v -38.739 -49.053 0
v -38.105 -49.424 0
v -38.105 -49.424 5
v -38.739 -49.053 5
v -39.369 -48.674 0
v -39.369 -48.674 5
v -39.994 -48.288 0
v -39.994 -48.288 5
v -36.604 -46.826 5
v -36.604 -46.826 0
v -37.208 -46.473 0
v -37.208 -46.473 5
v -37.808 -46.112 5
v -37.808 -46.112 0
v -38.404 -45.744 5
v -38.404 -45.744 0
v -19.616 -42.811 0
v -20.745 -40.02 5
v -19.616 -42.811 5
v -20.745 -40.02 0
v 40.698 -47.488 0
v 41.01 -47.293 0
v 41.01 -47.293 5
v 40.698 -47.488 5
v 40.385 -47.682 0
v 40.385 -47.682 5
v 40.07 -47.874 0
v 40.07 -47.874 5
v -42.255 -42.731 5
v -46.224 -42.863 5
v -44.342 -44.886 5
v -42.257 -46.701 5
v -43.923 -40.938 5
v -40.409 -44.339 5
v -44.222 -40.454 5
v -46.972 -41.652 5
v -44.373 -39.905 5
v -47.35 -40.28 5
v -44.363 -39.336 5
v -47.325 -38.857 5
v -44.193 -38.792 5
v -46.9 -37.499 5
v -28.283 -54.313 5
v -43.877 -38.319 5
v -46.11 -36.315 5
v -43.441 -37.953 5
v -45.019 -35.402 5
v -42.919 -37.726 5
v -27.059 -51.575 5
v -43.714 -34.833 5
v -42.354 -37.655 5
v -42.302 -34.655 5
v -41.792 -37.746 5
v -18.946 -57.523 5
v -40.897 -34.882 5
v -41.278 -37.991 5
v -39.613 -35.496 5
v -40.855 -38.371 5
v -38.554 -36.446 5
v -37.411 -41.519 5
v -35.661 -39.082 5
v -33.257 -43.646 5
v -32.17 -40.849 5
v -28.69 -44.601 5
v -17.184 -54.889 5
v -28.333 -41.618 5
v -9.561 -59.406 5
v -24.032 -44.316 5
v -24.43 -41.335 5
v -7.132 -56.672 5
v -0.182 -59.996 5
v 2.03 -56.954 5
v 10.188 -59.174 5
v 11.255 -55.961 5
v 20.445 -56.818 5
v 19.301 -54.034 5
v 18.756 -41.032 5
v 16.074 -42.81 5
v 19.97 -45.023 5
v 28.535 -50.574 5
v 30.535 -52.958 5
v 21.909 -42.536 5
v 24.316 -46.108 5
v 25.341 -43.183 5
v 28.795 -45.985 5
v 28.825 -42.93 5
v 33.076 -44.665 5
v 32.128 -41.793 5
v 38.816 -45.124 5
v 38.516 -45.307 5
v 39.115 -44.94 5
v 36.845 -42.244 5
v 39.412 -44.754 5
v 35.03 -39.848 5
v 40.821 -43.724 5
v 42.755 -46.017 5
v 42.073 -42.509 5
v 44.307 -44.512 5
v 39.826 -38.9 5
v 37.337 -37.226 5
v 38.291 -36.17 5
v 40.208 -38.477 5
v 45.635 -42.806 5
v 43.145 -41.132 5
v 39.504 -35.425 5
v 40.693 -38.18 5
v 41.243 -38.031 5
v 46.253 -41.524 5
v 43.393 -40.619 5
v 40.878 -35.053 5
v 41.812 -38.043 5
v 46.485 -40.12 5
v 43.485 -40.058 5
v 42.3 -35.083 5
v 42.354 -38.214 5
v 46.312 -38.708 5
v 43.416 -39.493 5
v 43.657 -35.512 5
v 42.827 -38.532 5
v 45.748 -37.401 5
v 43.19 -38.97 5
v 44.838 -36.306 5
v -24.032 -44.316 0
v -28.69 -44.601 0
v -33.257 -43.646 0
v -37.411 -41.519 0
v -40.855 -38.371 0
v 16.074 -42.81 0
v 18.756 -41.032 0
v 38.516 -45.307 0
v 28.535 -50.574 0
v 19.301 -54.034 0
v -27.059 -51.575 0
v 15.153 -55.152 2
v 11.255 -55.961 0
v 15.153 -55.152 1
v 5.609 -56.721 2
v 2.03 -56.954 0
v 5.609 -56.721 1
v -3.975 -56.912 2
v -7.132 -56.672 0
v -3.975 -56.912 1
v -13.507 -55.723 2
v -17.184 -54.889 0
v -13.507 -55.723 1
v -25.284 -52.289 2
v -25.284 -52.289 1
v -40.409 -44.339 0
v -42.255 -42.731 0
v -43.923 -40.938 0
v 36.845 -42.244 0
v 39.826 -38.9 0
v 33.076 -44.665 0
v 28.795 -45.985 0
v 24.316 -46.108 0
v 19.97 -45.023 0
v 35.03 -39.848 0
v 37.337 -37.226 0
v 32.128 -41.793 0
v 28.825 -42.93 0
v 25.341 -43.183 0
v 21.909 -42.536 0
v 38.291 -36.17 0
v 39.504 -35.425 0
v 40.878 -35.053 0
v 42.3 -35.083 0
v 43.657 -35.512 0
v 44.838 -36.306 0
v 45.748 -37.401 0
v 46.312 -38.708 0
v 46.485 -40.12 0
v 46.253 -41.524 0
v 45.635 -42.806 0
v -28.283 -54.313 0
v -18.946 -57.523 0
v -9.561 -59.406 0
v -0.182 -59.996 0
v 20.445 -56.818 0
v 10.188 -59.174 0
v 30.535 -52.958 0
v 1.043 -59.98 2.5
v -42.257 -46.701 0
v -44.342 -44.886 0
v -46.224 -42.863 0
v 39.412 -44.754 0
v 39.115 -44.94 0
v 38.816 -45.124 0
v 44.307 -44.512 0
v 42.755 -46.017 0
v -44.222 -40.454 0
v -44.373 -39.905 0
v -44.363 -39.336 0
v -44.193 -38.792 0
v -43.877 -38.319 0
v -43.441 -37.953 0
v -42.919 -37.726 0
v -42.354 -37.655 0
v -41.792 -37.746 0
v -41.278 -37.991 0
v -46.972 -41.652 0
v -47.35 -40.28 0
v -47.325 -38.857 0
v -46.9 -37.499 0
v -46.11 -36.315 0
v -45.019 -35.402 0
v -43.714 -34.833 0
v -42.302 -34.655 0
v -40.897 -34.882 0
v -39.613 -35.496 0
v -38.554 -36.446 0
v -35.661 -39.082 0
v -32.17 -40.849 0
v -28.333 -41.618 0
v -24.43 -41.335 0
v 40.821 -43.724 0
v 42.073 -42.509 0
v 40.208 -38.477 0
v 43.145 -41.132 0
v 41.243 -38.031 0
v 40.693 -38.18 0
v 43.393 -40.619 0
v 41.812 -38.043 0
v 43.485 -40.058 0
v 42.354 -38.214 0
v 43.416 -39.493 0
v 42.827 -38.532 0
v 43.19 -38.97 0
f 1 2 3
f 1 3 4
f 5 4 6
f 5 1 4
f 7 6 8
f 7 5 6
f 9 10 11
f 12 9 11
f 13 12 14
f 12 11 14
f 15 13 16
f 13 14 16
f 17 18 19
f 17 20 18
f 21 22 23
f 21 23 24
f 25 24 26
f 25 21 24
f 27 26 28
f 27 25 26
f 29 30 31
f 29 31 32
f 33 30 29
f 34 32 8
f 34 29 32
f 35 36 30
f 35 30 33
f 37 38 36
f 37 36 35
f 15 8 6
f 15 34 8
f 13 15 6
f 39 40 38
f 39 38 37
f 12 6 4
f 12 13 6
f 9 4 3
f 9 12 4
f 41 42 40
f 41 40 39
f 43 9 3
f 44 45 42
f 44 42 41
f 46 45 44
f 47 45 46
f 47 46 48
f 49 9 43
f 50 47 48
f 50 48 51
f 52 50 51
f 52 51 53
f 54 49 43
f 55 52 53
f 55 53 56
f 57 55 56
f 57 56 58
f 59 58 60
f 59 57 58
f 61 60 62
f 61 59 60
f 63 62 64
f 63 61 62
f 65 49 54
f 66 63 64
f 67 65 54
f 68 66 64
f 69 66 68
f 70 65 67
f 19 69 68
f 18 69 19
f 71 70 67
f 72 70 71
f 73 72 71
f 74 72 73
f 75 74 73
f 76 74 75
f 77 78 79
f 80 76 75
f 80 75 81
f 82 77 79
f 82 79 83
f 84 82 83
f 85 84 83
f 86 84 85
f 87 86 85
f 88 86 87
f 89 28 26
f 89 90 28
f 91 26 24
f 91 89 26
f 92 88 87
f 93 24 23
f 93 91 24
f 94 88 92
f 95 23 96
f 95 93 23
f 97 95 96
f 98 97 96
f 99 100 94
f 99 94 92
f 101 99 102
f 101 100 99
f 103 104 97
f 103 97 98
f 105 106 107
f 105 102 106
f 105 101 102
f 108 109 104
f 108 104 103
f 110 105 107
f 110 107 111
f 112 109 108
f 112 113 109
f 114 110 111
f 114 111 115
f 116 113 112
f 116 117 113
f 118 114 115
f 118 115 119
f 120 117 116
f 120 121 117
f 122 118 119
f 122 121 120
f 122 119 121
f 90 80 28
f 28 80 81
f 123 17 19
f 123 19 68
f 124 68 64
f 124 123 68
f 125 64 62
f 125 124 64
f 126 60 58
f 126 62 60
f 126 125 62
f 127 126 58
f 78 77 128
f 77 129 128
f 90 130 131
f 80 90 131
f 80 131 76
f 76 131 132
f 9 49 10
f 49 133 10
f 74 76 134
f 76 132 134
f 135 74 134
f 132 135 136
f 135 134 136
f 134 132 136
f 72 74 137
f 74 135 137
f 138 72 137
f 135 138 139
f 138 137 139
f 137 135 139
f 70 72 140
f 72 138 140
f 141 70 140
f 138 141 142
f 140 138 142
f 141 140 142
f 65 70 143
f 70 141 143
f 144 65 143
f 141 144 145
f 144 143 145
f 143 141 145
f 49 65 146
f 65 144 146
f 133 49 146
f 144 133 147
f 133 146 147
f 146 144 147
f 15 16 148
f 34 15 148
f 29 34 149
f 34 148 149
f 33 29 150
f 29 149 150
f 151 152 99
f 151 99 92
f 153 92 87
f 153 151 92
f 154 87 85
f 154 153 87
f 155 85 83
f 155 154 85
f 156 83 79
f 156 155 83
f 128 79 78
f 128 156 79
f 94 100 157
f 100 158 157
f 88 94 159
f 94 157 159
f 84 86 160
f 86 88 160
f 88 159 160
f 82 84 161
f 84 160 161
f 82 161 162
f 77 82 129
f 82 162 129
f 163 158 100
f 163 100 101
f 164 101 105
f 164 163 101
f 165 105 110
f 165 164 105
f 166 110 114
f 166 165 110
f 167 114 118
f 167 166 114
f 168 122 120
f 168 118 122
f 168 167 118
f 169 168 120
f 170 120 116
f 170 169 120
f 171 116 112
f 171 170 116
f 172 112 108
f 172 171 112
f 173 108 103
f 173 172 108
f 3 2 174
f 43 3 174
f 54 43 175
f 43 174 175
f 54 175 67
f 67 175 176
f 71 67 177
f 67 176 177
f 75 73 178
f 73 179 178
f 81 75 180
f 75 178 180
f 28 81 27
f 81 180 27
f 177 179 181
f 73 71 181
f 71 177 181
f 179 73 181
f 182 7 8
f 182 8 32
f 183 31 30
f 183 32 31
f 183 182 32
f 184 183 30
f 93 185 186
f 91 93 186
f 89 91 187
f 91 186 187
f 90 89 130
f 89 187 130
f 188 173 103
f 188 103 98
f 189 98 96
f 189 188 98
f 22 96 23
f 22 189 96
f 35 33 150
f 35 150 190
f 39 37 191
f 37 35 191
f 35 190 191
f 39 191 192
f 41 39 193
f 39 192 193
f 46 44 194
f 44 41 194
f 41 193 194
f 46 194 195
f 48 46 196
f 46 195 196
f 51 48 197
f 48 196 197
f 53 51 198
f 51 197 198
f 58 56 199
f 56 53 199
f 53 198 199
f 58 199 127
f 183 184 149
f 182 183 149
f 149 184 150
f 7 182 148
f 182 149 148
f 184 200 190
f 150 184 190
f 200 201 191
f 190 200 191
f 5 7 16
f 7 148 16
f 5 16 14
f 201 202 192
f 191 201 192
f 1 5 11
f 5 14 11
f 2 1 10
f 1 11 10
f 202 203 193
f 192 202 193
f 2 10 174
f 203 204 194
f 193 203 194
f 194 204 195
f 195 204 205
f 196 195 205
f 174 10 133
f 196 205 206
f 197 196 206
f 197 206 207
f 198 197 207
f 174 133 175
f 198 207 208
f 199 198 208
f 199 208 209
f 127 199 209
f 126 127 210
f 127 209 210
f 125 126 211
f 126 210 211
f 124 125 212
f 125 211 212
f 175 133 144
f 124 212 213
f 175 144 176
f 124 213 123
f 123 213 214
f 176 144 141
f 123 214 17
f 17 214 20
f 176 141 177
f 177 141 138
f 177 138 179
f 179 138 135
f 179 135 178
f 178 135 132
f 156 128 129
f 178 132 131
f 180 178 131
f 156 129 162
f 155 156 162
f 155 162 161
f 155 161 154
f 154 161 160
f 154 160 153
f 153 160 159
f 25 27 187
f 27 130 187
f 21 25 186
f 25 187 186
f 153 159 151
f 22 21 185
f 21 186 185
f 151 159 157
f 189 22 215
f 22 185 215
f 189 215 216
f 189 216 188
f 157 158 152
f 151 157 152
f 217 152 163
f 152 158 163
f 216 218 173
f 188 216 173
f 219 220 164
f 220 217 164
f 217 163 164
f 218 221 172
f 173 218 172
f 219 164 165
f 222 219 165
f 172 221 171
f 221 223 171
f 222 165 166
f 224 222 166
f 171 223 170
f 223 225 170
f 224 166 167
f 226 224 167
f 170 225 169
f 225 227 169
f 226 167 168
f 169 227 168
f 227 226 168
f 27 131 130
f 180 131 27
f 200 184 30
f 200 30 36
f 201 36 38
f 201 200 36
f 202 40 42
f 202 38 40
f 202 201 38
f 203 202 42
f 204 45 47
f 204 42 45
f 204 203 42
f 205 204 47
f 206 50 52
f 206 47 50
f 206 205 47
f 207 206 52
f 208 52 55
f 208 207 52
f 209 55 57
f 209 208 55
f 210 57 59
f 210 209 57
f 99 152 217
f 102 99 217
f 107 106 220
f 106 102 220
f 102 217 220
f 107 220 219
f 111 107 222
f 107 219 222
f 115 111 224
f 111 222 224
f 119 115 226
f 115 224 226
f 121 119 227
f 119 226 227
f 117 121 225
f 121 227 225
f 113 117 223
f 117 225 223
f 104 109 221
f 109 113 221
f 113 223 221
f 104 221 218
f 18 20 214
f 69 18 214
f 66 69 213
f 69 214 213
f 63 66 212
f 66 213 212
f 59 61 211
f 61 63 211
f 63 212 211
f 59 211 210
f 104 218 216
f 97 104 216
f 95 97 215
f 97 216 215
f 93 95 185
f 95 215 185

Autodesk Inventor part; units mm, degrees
ref_plane "YZ Plane" through (0, 0, 0) normal (1, 0, 0) x (0, 1, 0)
ref_plane "XZ Plane" through (0, 0, 0) normal (0, 1, 0) x (-1, 0, 0)
ref_plane "XY Plane" through (0, 0, 0) normal (0, 0, 1) x (1, 0, 0)
sketch "スケッチ1" plane through (0, 0, 0) normal (0, 0, 1) x (1, 0, 0)
  spline S0 degree 4 poles (38.5164, -45.3071) (32.8487, -48.7376) (24.871, -52.6644) (14.1977, -56.036) (0.8351, -57.2731) (-12.4819, -56.5781) (-23.1394, -53.6461) (-31.0456, -50.0372) (-36.604, -46.8264) knots 0 0 0 0 0 0.316482 0.440352 0.563601 0.687002 1 1 1 1 1
  circle A0 centre (0, 0) radius 1.3
  circle A1 centre (0, 0) radius 2.5
  circle A2 centre (0, 0) radius 5
  line L0 (4.899, 1) -> (9.798, -23)
  line L1 (-4.899, 1) -> (-9.798, -23)
  line L2 (-3.817, -10.1196) -> (-8.9705, -20.5808)
  circle A3 centre (0, -12) radius 4.255
  line L3 (3.817, -10.1196) -> (8.9705, -20.5808)
  circle A4 centre (0.0033, -24.9496) radius 10
  circle A5 centre (0, -25) radius 7.025
  spline S1 degree 4 poles (51.4895, -34.9586) (51.1529, -35.2256) (50.6846, -35.5944) (50.0873, -36.0604) (49.3638, -36.6179) (48.8453, -37.0139) (48.332, -37.4027) (47.8236, -37.7843) (47.3201, -38.159) (46.8211, -38.527) (46.3265, -38.8884) (45.8362, -39.2435) (45.3499, -39.5924) (44.8675, -39.9354) (44.3888, -40.2724) (43.9136, -40.6038) (43.4419, -40.9296) (42.9735, -41.25) (42.5081, -41.5651) (42.0458, -41.8751) (41.5864, -42.18) (41.1297, -42.48) (40.6756, -42.7752) (40.2241, -43.0657) (39.7749, -43.3517) (39.328, -43.6331) (38.8834, -43.9101) (38.4408, -44.1828) (38.0002, -44.4513) (37.5615, -44.7157) (37.1246, -44.9759) (36.6894, -45.2322) (36.2559, -45.4846) (35.8239, -45.7332) (35.3934, -45.9779) (34.9643, -46.2189) (34.5365, -46.4563) (34.1101, -46.6901) (33.6848, -46.9203) (33.2606, -47.1471) (32.8375, -47.3704) (32.4155, -47.5903) (31.9943, -47.8068) (31.5741, -48.0201) (31.1548, -48.23) (30.7362, -48.4368) (30.3184, -48.6403) (29.9013, -48.8407) (29.4848, -49.038) (29.069, -49.2322) (28.6537, -49.4233) (28.239, -49.6114) (27.8248, -49.7965) (27.411, -49.9786) (26.9977, -50.1578) (26.5847, -50.334) (26.1721, -50.5073) (25.7598, -50.6777) (25.3479, -50.8453) (24.9362, -51.01) (24.5247, -51.1719) (24.1135, -51.331) (23.7024, -51.4873) (23.2916, -51.6408) (22.8809, -51.7915) (22.4703, -51.9394) (22.0598, -52.0847) (21.6495, -52.2271) (21.2392, -52.3669) (20.829, -52.504) (20.4188, -52.6383) (20.0086, -52.77) (19.5985, -52.8989) (19.1884, -53.0252) (18.7783, -53.1489) (18.3681, -53.2698) (17.958, -53.3881) (17.5477, -53.5038) (17.1375, -53.6167) (16.7272, -53.7271) (16.3168, -53.8348) (15.9064, -53.9399) (15.4959, -54.0424) (15.0853, -54.1422) (14.6747, -54.2394) (14.2639, -54.334) (13.8531, -54.426) (13.4422, -54.5153) (13.0311, -54.6021) (12.62, -54.6862) (12.2088, -54.7677) (11.7975, -54.8466) (11.3861, -54.9229) (10.9746, -54.9966) (10.563, -55.0677) (10.1513, -55.1362) (9.7395, -55.2021) (9.3276, -55.2654) (8.9156, -55.3261) (8.5036, -55.3842) (8.0914, -55.4397) (7.6792, -55.4926) (7.2669, -55.5428) (6.8545, -55.5905) (6.4421, -55.6356) (6.0295, -55.6781) (5.617, -55.718) (5.2043, -55.7553) (4.7916, -55.79) (4.3789, -55.822) (3.9661, -55.8515) (3.5533, -55.8784) (3.1405, -55.9027) (2.7276, -55.9244) (2.3147, -55.9435) (1.9018, -55.96) (1.489, -55.9739) (1.0761, -55.9851) (0.6632, -55.9938) (0.2503, -55.9999) (-0.1625, -56.0034) (-0.5753, -56.0043) (-0.9881, -56.0026) (-1.4008, -55.9982) (-1.8134, -55.9913) (-2.2261, -55.9818) (-2.6386, -55.9697) (-3.0511, -55.955) (-3.4634, -55.9376) (-3.8757, -55.9177) (-4.2879, -55.8952) (-4.7, -55.8701) (-5.112, -55.8424) (-5.5239, -55.8121) (-5.9357, -55.7791) (-6.3473, -55.7436) (-6.7588, -55.7055) (-7.1701, -55.6648) (-7.5813, -55.6215) (-7.9923, -55.5756) (-8.4032, -55.5271) (-8.8139, -55.4761) (-9.2244, -55.4224) (-9.6348, -55.3661) (-10.0449, -55.3072) (-10.4549, -55.2458) (-10.8647, -55.1817) (-11.2743, -55.1151) (-11.6837, -55.0458) (-12.0928, -54.974) (-12.5018, -54.8995) (-12.9105, -54.8225) (-13.3191, -54.7429) (-13.7274, -54.6607) (-14.1355, -54.5759) (-14.5434, -54.4884) (-14.951, -54.3984) (-15.3585, -54.3058) (-15.7657, -54.2106) (-16.1727, -54.1128) (-16.5794, -54.0124) (-16.986, -53.9094) (-17.3923, -53.8038) (-17.7984, -53.6956) (-18.2043, -53.5848) (-18.61, -53.4713) (-19.0155, -53.3553) (-19.4208, -53.2366) (-19.8259, -53.1153) (-20.2308, -52.9913) (-20.6356, -52.8648) (-21.0401, -52.7355) (-21.4446, -52.6037) (-21.8489, -52.4692) (-22.253, -52.332) (-22.657, -52.1921) (-23.0609, -52.0496) (-23.4648, -51.9044) (-23.8685, -51.7565) (-24.2722, -51.6059) (-24.6759, -51.4526) (-25.0796, -51.2965) (-25.4832, -51.1377) (-25.8869, -50.9761) (-26.2907, -50.8117) (-26.6945, -50.6446) (-27.0985, -50.4746) (-27.5026, -50.3018) (-27.9068, -50.1261) (-28.3113, -49.9476) (-28.7161, -49.7661) (-29.1211, -49.5817) (-29.5265, -49.3944) (-29.9322, -49.204) (-30.3384, -49.0107) (-30.7451, -48.8142) (-31.1523, -48.6147) (-31.5601, -48.412) (-31.9685, -48.2062) (-32.3777, -47.9971) (-32.7876, -47.7847) (-33.1984, -47.569) (-33.6102, -47.3499) (-34.023, -47.1273) (-34.4368, -46.9012) (-34.8519, -46.6716) (-35.2682, -46.4382) (-35.686, -46.2011) (-36.1052, -45.9602) (-36.5261, -45.7154) (-36.9487, -45.4665) (-37.3732, -45.2135) (-37.7997, -44.9563) (-38.2284, -44.6947) (-38.6594, -44.4287) (-39.0929, -44.158) (-39.5291, -43.8825) (-39.9681, -43.6021) (-40.4101, -43.3165) (-40.8555, -43.0257) (-41.3043, -42.7295) (-41.7569, -42.4275) (-42.2135, -42.1196) (-42.6743, -41.8055) (-43.1398, -41.485) (-43.6102, -41.1578) (-44.0858, -40.8236) (-44.567, -40.482) (-45.0542, -40.1327) (-45.5479, -39.7753) (-46.0484, -39.4095) (-46.5564, -39.0347) (-47.0722, -38.6504) (-47.5966, -38.2562) (-48.13, -37.8515) (-48.6732, -37.4356) (-49.2269, -37.0078) (-50.01, -36.3976) (-50.6631, -35.8819) (-51.1798, -35.4699) (-51.5542, -35.1694) knots 0 0 0 0 0 0.01253 0.017489 0.022414 0.027307 0.032168 0.036998 0.041798 0.046569 0.051311 0.056026 0.060715 0.065378 0.070016 0.074629 0.079219 0.083786 0.088331 0.092854 0.097357 0.101839 0.106302 0.110746 0.115172 0.119579 0.12397 0.128343 0.132701 0.137042 0.141369 0.14568 0.149978 0.154261 0.158531 0.162788 0.167033 0.171265 0.175486 0.179695 0.183893 0.18808 0.192257 0.196424 0.200581 0.204729 0.208867 0.212997 0.217119 0.221232 0.225337 0.229434 0.233524 0.237607 0.241682 0.245751 0.249814 0.25387 0.25792 0.261964 0.266002 0.270035 0.274062 0.278085 0.282102 0.286114 0.290122 0.294125 0.298124 0.302119 0.30611 0.310097 0.31408 0.318059 0.322035 0.326007 0.329976 0.333942 0.337905 0.341865 0.345823 0.349777 0.353729 0.357678 0.361625 0.365569 0.369511 0.373451 0.377389 0.381325 0.385259 0.389191 0.393122 0.39705 0.400977 0.404903 0.408826 0.412749 0.41667 0.42059 0.424508 0.428426 0.432342 0.436257 0.440171 0.444085 0.447997 0.451908 0.455819 0.459729 0.463638 0.467547 0.471454 0.475362 0.479269 0.483175 0.487081 0.490987 0.494892 0.498797 0.502702 0.506607 0.510511 0.514415 0.51832 0.522224 0.526128 0.530033 0.533937 0.537842 0.541747 0.545652 0.549557 0.553463 0.557369 0.561276 0.565183 0.56909 0.572998 0.576907 0.580817 0.584727 0.588638 0.592549 0.596462 0.600375 0.60429 0.608205 0.612122 0.616039 0.619958 0.623879 0.6278 0.631723 0.635647 0.639573 0.643501 0.64743 0.651361 0.655294 0.659229 0.663165 0.667104 0.671045 0.674989 0.678934 0.682883 0.686833 0.690787 0.694743 0.698702 0.702664 0.70663 0.710598 0.71457 0.718546 0.722525 0.726508 0.730496 0.734487 0.738483 0.742483 0.746488 0.750498 0.754514 0.758534 0.76256 0.766592 0.77063 0.774674 0.778725 0.782783 0.786848 0.79092 0.795001 0.799089 0.803186 0.807291 0.811406 0.815531 0.819665 0.82381 0.827967 0.832134 0.836314 0.840506 0.844711 0.84893 0.853163 0.857412 0.861676 0.865957 0.870254 0.87457 0.878905 0.88326 0.887636 0.892033 0.896453 0.900898 0.905368 0.909864 0.914388 0.918942 0.923526 0.928143 0.932794 0.937481 0.942205 0.94697 0.951777 0.956628 0.961526 0.966473 0.971473 0.976527 0.981641 0.986815 1 1 1 1 1 construction
  line L4 (-36.604, -46.8264) -> (0, 0) construction
  line L5 (0, 0) -> (38.5164, -45.3071) construction
  line L6 (-38.4038, -45.7442) -> (0, 0) construction
  line L7 (39.4123, -44.7541) -> (0, 0) construction
  line L8 (0, 0) -> (-43.9228, -40.9378) construction
  line L9 (43.1454, -41.1321) -> (0, 0) construction
  arc A6 (-38.4038, -45.7442) -> (-36.604, -46.8264) centre (-6.5918, 5.1281) ccw
  arc A7 (38.5164, -45.3071) -> (39.4123, -44.7541) centre (7.4479, 6.0227) ccw
  arc A8 (-43.9228, -40.9378) -> (-38.4038, -45.7442) centre (-26.0471, -25.9839) ccw
  arc A9 (39.4123, -44.7541) -> (43.1454, -41.1321) centre (32.7173, -34.1188) ccw
  line L10 (36.2541, -30.9682) -> (42.4664, -35.652)
  line L11 (-31.1512, -26.4822) -> (-36.604, -31.0671)
  line L12 (-36.604, -96) -> (31.1535, -96) construction
  line L13 (-33.8776, -60) -> (44.0237, -60) construction
  line L14 (59.4013, -96) -> (59.4013, -81)
  line L15 (59.4013, -81) -> (-53.0814, -81) construction
  arc A10 (36.2232, -74.5536) -> (59.4013, -81) centre (70, 2) ccw construction
  line L16 (70, 2) -> (36.2232, -74.5536) construction
  line L17 (70, 2) -> (59.4013, -81) construction
  arc A11 (-71.6102, -42.5485) -> (-53.0814, -81) centre (70, 2) ccw construction
  line L18 (70, 2) -> (-71.6102, -42.5485) construction
  line L19 (70, 2) -> (-53.0814, -81) construction
  line L20 (-71.6102, -42.5485) -> (36.2232, -74.5536) construction
  arc A12 (-53.0814, -81) -> (-15.0732, -119.6576) centre (70, 2) ccw construction
  line L21 (70, 2) -> (-15.0732, -119.6576) construction
  line L22 (70, 2) -> (-53.0814, -81) construction
  arc A13 (59.4013, -81) -> (89.9091, -79.2709) centre (70, 2) ccw construction
  line L23 (70, 2) -> (89.9091, -79.2709) construction
  line L24 (70, 2) -> (59.4013, -81) construction
  line L25 (-15.0732, -119.6576) -> (89.9091, -79.2709) construction
  arc A14 (-40.8548, -38.3712) -> (-43.9228, -40.9378) centre (-42.3888, -39.6545) ccw
  line L26 (-43.9228, -40.9378) -> (-42.3888, -39.6545) construction
  line L27 (-40.8548, -38.3712) -> (-42.3888, -39.6545) construction
  arc A15 (43.1454, -41.1321) -> (39.8262, -38.8998) centre (41.4858, -40.016) ccw
  line L28 (43.1454, -41.1321) -> (41.4858, -40.016) construction
  line L29 (39.8262, -38.8998) -> (41.4858, -40.016) construction
  arc A16 (9.8434, -26.7306) -> (39.8262, -38.8998) centre (26.1095, -29.6747) ccw
  arc A17 (-40.8548, -38.3712) -> (-9.9651, -25.7437) centre (-27.4224, -27.1344) ccw
  arc A18 (-38.5537, -36.4463) -> (-12.9543, -25.9986) centre (-27.4224, -27.1344) ccw
  arc A19 (-38.5537, -36.4463) -> (-46.2238, -42.8627) centre (-42.3888, -39.6545) ccw
  arc A20 (-46.2238, -42.8627) -> (-39.9944, -48.2878) centre (-26.0471, -25.9839) ccw
  arc A21 (-39.9944, -48.2878) -> (-38.1046, -49.4241) centre (-6.5918, 5.1281) ccw
  arc A22 (40.0699, -47.8736) -> (41.0105, -47.2929) centre (7.4479, 6.0227) ccw
  arc A23 (41.0105, -47.2929) -> (45.6348, -42.8063) centre (32.7173, -34.1188) ccw
  arc A24 (45.6348, -42.8063) -> (37.3369, -37.2256) centre (41.4858, -40.016) ccw
  arc A25 (12.7927, -27.28) -> (37.3369, -37.2256) centre (26.1095, -29.6747) ccw
  line L30 (-20.7448, -40.0195) -> (-19.6157, -42.8107)
  line L31 (18.7559, -41.0323) -> (16.0741, -42.8103)
  spline S2 degree 4 poles (38.5164, -45.3071) (32.8478, -48.7393) (24.8691, -52.6682) (14.1948, -56.0416) (0.8318, -57.2787) (-12.4847, -56.5826) (-23.1412, -53.6487) (-31.0464, -50.0382) (-36.604, -46.8264) knots 0 0 0 0 0 0.316504 0.440374 0.56362 0.687015 1 1 1 1 1
  circle A26 centre (0, 0) radius 1.3
  circle A27 centre (0, 0) radius 2.5
  circle A28 centre (0, 0) radius 5
  line L32 (4.899, 1) -> (9.798, -23)
  line L33 (-4.899, 1) -> (-9.798, -23)
  line L34 (-3.817, -10.1196) -> (-8.9705, -20.5808)
  circle A29 centre (0, -12) radius 4.255
  line L35 (3.817, -10.1196) -> (8.9705, -20.5808)
  circle A30 centre (0.0012, -24.9711) radius 10
  circle A31 centre (0, -25) radius 7.025
  spline S3 degree 4 poles (51.4895, -34.9586) (51.1529, -35.2256) (50.6846, -35.5944) (50.0873, -36.0604) (49.3638, -36.6179) (48.8453, -37.0139) (48.332, -37.4027) (47.8236, -37.7843) (47.3201, -38.159) (46.8211, -38.527) (46.3265, -38.8884) (45.8362, -39.2435) (45.3499, -39.5924) (44.8675, -39.9354) (44.3888, -40.2724) (43.9136, -40.6038) (43.4419, -40.9296) (42.9735, -41.25) (42.5081, -41.5651) (42.0458, -41.8751) (41.5864, -42.18) (41.1297, -42.48) (40.6756, -42.7752) (40.2241, -43.0657) (39.7749, -43.3517) (39.328, -43.6331) (38.8834, -43.9101) (38.4408, -44.1828) (38.0002, -44.4513) (37.5615, -44.7157) (37.1246, -44.9759) (36.6894, -45.2322) (36.2559, -45.4846) (35.8239, -45.7332) (35.3934, -45.9779) (34.9643, -46.2189) (34.5365, -46.4563) (34.1101, -46.6901) (33.6848, -46.9203) (33.2606, -47.1471) (32.8375, -47.3704) (32.4155, -47.5903) (31.9943, -47.8068) (31.5741, -48.0201) (31.1548, -48.23) (30.7362, -48.4368) (30.3184, -48.6403) (29.9013, -48.8407) (29.4848, -49.038) (29.069, -49.2322) (28.6537, -49.4233) (28.239, -49.6114) (27.8248, -49.7965) (27.411, -49.9786) (26.9977, -50.1578) (26.5847, -50.334) (26.1721, -50.5073) (25.7598, -50.6777) (25.3479, -50.8453) (24.9362, -51.01) (24.5247, -51.1719) (24.1135, -51.331) (23.7024, -51.4873) (23.2916, -51.6408) (22.8809, -51.7915) (22.4703, -51.9394) (22.0598, -52.0847) (21.6495, -52.2271) (21.2392, -52.3669) (20.829, -52.504) (20.4188, -52.6383) (20.0086, -52.77) (19.5985, -52.8989) (19.1884, -53.0252) (18.7783, -53.1489) (18.3681, -53.2698) (17.958, -53.3881) (17.5477, -53.5038) (17.1375, -53.6167) (16.7272, -53.7271) (16.3168, -53.8348) (15.9064, -53.9399) (15.4959, -54.0424) (15.0853, -54.1422) (14.6747, -54.2394) (14.2639, -54.334) (13.8531, -54.426) (13.4422, -54.5153) (13.0311, -54.6021) (12.62, -54.6862) (12.2088, -54.7677) (11.7975, -54.8466) (11.3861, -54.9229) (10.9746, -54.9966) (10.563, -55.0677) (10.1513, -55.1362) (9.7395, -55.2021) (9.3276, -55.2654) (8.9156, -55.3261) (8.5036, -55.3842) (8.0914, -55.4397) (7.6792, -55.4926) (7.2669, -55.5428) (6.8545, -55.5905) (6.4421, -55.6356) (6.0295, -55.6781) (5.617, -55.718) (5.2043, -55.7553) (4.7916, -55.79) (4.3789, -55.822) (3.9661, -55.8515) (3.5533, -55.8784) (3.1405, -55.9027) (2.7276, -55.9244) (2.3147, -55.9435) (1.9018, -55.96) (1.489, -55.9739) (1.0761, -55.9851) (0.6632, -55.9938) (0.2503, -55.9999) (-0.1625, -56.0034) (-0.5753, -56.0043) (-0.9881, -56.0026) (-1.4008, -55.9982) (-1.8134, -55.9913) (-2.2261, -55.9818) (-2.6386, -55.9697) (-3.0511, -55.955) (-3.4634, -55.9376) (-3.8757, -55.9177) (-4.2879, -55.8952) (-4.7, -55.8701) (-5.112, -55.8424) (-5.5239, -55.8121) (-5.9357, -55.7791) (-6.3473, -55.7436) (-6.7588, -55.7055) (-7.1701, -55.6648) (-7.5813, -55.6215) (-7.9923, -55.5756) (-8.4032, -55.5271) (-8.8139, -55.4761) (-9.2244, -55.4224) (-9.6348, -55.3661) (-10.0449, -55.3072) (-10.4549, -55.2458) (-10.8647, -55.1817) (-11.2743, -55.1151) (-11.6837, -55.0458) (-12.0928, -54.974) (-12.5018, -54.8995) (-12.9105, -54.8225) (-13.3191, -54.7429) (-13.7274, -54.6607) (-14.1355, -54.5759) (-14.5434, -54.4884) (-14.951, -54.3984) (-15.3585, -54.3058) (-15.7657, -54.2106) (-16.1727, -54.1128) (-16.5794, -54.0124) (-16.986, -53.9094) (-17.3923, -53.8038) (-17.7984, -53.6956) (-18.2043, -53.5848) (-18.61, -53.4713) (-19.0155, -53.3553) (-19.4208, -53.2366) (-19.8259, -53.1153) (-20.2308, -52.9913) (-20.6356, -52.8648) (-21.0401, -52.7355) (-21.4446, -52.6037) (-21.8489, -52.4692) (-22.253, -52.332) (-22.657, -52.1921) (-23.0609, -52.0496) (-23.4648, -51.9044) (-23.8685, -51.7565) (-24.2722, -51.6059) (-24.6759, -51.4526) (-25.0796, -51.2965) (-25.4832, -51.1377) (-25.8869, -50.9761) (-26.2907, -50.8117) (-26.6945, -50.6446) (-27.0985, -50.4746) (-27.5026, -50.3018) (-27.9068, -50.1261) (-28.3113, -49.9476) (-28.7161, -49.7661) (-29.1211, -49.5817) (-29.5265, -49.3944) (-29.9322, -49.204) (-30.3384, -49.0107) (-30.7451, -48.8142) (-31.1523, -48.6147) (-31.5601, -48.412) (-31.9685, -48.2062) (-32.3777, -47.9971) (-32.7876, -47.7847) (-33.1984, -47.569) (-33.6102, -47.3499) (-34.023, -47.1273) (-34.4368, -46.9012) (-34.8519, -46.6716) (-35.2682, -46.4382) (-35.686, -46.2011) (-36.1052, -45.9602) (-36.5261, -45.7154) (-36.9487, -45.4665) (-37.3732, -45.2135) (-37.7997, -44.9563) (-38.2284, -44.6947) (-38.6594, -44.4287) (-39.0929, -44.158) (-39.5291, -43.8825) (-39.9681, -43.6021) (-40.4101, -43.3165) (-40.8555, -43.0257) (-41.3043, -42.7295) (-41.7569, -42.4275) (-42.2135, -42.1196) (-42.6743, -41.8055) (-43.1398, -41.485) (-43.6102, -41.1578) (-44.0858, -40.8236) (-44.567, -40.482) (-45.0542, -40.1327) (-45.5479, -39.7753) (-46.0484, -39.4095) (-46.5564, -39.0347) (-47.0722, -38.6504) (-47.5966, -38.2562) (-48.13, -37.8515) (-48.6732, -37.4356) (-49.2269, -37.0078) (-50.01, -36.3976) (-50.6631, -35.8819) (-51.1798, -35.4699) (-51.5542, -35.1694) knots 0 0 0 0 0 0.01253 0.017489 0.022414 0.027307 0.032168 0.036998 0.041798 0.046569 0.051311 0.056026 0.060715 0.065378 0.070016 0.074629 0.079219 0.083786 0.088331 0.092854 0.097357 0.101839 0.106302 0.110746 0.115172 0.119579 0.12397 0.128343 0.132701 0.137042 0.141369 0.14568 0.149978 0.154261 0.158531 0.162788 0.167033 0.171265 0.175486 0.179695 0.183893 0.18808 0.192257 0.196424 0.200581 0.204729 0.208867 0.212997 0.217119 0.221232 0.225337 0.229434 0.233524 0.237607 0.241682 0.245751 0.249814 0.25387 0.25792 0.261964 0.266002 0.270035 0.274062 0.278085 0.282102 0.286114 0.290122 0.294125 0.298124 0.302119 0.30611 0.310097 0.31408 0.318059 0.322035 0.326007 0.329976 0.333942 0.337905 0.341865 0.345823 0.349777 0.353729 0.357678 0.361625 0.365569 0.369511 0.373451 0.377389 0.381325 0.385259 0.389191 0.393122 0.39705 0.400977 0.404903 0.408826 0.412749 0.41667 0.42059 0.424508 0.428426 0.432342 0.436257 0.440171 0.444085 0.447997 0.451908 0.455819 0.459729 0.463638 0.467547 0.471454 0.475362 0.479269 0.483175 0.487081 0.490987 0.494892 0.498797 0.502702 0.506607 0.510511 0.514415 0.51832 0.522224 0.526128 0.530033 0.533937 0.537842 0.541747 0.545652 0.549557 0.553463 0.557369 0.561276 0.565183 0.56909 0.572998 0.576907 0.580817 0.584727 0.588638 0.592549 0.596462 0.600375 0.60429 0.608205 0.612122 0.616039 0.619958 0.623879 0.6278 0.631723 0.635647 0.639573 0.643501 0.64743 0.651361 0.655294 0.659229 0.663165 0.667104 0.671045 0.674989 0.678934 0.682883 0.686833 0.690787 0.694743 0.698702 0.702664 0.70663 0.710598 0.71457 0.718546 0.722525 0.726508 0.730496 0.734487 0.738483 0.742483 0.746488 0.750498 0.754514 0.758534 0.76256 0.766592 0.77063 0.774674 0.778725 0.782783 0.786848 0.79092 0.795001 0.799089 0.803186 0.807291 0.811406 0.815531 0.819665 0.82381 0.827967 0.832134 0.836314 0.840506 0.844711 0.84893 0.853163 0.857412 0.861676 0.865957 0.870254 0.87457 0.878905 0.88326 0.887636 0.892033 0.896453 0.900898 0.905368 0.909864 0.914388 0.918942 0.923526 0.928143 0.932794 0.937481 0.942205 0.94697 0.951777 0.956628 0.961526 0.966473 0.971473 0.976527 0.981641 0.986815 1 1 1 1 1 construction
  line L36 (-36.604, -46.8264) -> (0, 0) construction
  line L37 (0, 0) -> (38.5164, -45.3071) construction
  line L38 (-38.4035, -45.7439) -> (0, 0) construction
  line L39 (39.4122, -44.754) -> (0, 0) construction
  line L40 (0, 0) -> (-43.9228, -40.9378) construction
  line L41 (43.1454, -41.1321) -> (0, 0) construction
  arc A32 (-38.4035, -45.7439) -> (-36.604, -46.8264) centre (-6.5817, 5.1223) ccw
  arc A33 (38.5164, -45.3071) -> (39.4122, -44.754) centre (7.4403, 6.0181) ccw
  arc A34 (-43.9228, -40.9378) -> (-38.4035, -45.7439) centre (-26.0235, -25.9549) ccw
  arc A35 (39.4122, -44.754) -> (43.1454, -41.1321) centre (32.7099, -34.1106) ccw
  line L42 (36.2541, -30.9682) -> (42.4664, -35.652)
  line L43 (-31.1512, -26.4822) -> (-36.604, -31.0671)
  line L44 (-36.604, -96) -> (31.1535, -96) construction
  line L45 (-33.8776, -60) -> (44.0237, -60) construction
  line L46 (59.4013, -96) -> (59.4013, -81)
  line L47 (59.4013, -81) -> (-53.0814, -81) construction
  arc A36 (36.2232, -74.5536) -> (59.4013, -81) centre (70, 2) ccw construction
  line L48 (70, 2) -> (36.2232, -74.5536) construction
  line L49 (70, 2) -> (59.4013, -81) construction
  arc A37 (-71.6102, -42.5485) -> (-53.0814, -81) centre (70, 2) ccw construction
  line L50 (70, 2) -> (-71.6102, -42.5485) construction
  line L51 (70, 2) -> (-53.0814, -81) construction
  line L52 (-71.6102, -42.5485) -> (36.2232, -74.5536) construction
  arc A38 (-53.0814, -81) -> (-15.0732, -119.6576) centre (70, 2) ccw construction
  line L53 (70, 2) -> (-15.0732, -119.6576) construction
  line L54 (70, 2) -> (-53.0814, -81) construction
  arc A39 (59.4013, -81) -> (89.9091, -79.2709) centre (70, 2) ccw construction
  line L55 (70, 2) -> (89.9091, -79.2709) construction
  line L56 (70, 2) -> (59.4013, -81) construction
  line L57 (-15.0732, -119.6576) -> (89.9091, -79.2709) construction
  arc A40 (-40.8555, -38.3703) -> (-43.9228, -40.9378) centre (-42.3892, -39.654) ccw
  line L58 (-43.9228, -40.9378) -> (-42.3892, -39.654) construction
  line L59 (-40.8555, -38.3703) -> (-42.3892, -39.654) construction
  arc A41 (43.1454, -41.1321) -> (39.8267, -38.8991) centre (41.4861, -40.0156) ccw
  line L60 (43.1454, -41.1321) -> (41.4861, -40.0156) construction
  line L61 (39.8267, -38.8991) -> (41.4861, -40.0156) construction
  arc A42 (9.843, -26.7427) -> (39.8267, -38.8991) centre (26.1119, -29.6712) ccw
  arc A43 (-40.8555, -38.3703) -> (-9.968, -25.7556) centre (-27.4267, -27.1294) ccw
  spline S4 degree 5 poles (-38.1046, -49.4241) (-30.9925, -53.5325) (-23.4374, -56.8772) (-15.4062, -59.1353) (1.1247, -61.1969) (17.5495, -58.3842) (25.5171, -55.7659) (32.9958, -52.1545) (40.0699, -47.8736) knots 0 0 0 0 0 0 0.498337 0.498337 0.498337 1 1 1 1 1 1
  point P0 (50.9482, -35.3862)
  point P1 (50.4129, -35.8055)
  point P2 (49.8835, -36.2167)
  point P3 (49.3597, -36.6202)
  point P4 (48.8414, -37.0162)
  point P5 (48.3282, -37.4048)
  point P6 (47.82, -37.7863)
  point P7 (47.3165, -38.1609)
  point P8 (46.8177, -38.5288)
  point P9 (46.3232, -38.8901)
  point P10 (45.833, -39.2452)
  point P11 (45.3467, -39.594)
  point P12 (44.8644, -39.9368)
  point P13 (44.3858, -40.2738)
  point P14 (43.9108, -40.6051)
  point P15 (43.4391, -40.9309)
  point P16 (42.9708, -41.2512)
  point P17 (42.5055, -41.5662)
  point P18 (42.0433, -41.8761)
  point P19 (41.5839, -42.181)
  point P20 (41.1273, -42.4809)
  point P21 (40.6733, -42.7761)
  point P22 (40.2218, -43.0666)
  point P23 (39.7727, -43.3524)
  point P24 (39.3259, -43.6338)
  point P25 (38.8813, -43.9108)
  point P26 (38.4387, -44.1834)
  point P27 (37.9982, -44.4519)
  point P28 (37.5596, -44.7162)
  point P29 (37.1227, -44.9764)
  point P30 (36.6876, -45.2327)
  point P31 (36.2541, -45.485)
  point P32 (35.8222, -45.7335)
  point P33 (35.3917, -45.9782)
  point P34 (34.9627, -46.2192)
  point P35 (34.535, -46.4566)
  point P36 (34.1085, -46.6903)
  point P37 (33.6833, -46.9205)
  point P38 (33.2592, -47.1472)
  point P39 (32.8361, -47.3705)
  point P40 (32.4141, -47.5904)
  point P41 (31.993, -47.8069)
  point P42 (31.5729, -48.0201)
  point P43 (31.1535, -48.23)
  point P44 (30.735, -48.4368)
  point P45 (30.3172, -48.6403)
  point P46 (29.9002, -48.8407)
  point P47 (29.4837, -49.0379)
  point P48 (29.0679, -49.2321)
  point P49 (28.6527, -49.4232)
  point P50 (28.238, -49.6113)
  point P51 (27.8238, -49.7963)
  point P52 (27.41, -49.9784)
  point P53 (26.9967, -50.1576)
  point P54 (26.5838, -50.3338)
  point P55 (26.1712, -50.5071)
  point P56 (25.759, -50.6775)
  point P57 (25.347, -50.8451)
  point P58 (24.9353, -51.0098)
  point P59 (24.5239, -51.1717)
  point P60 (24.1127, -51.3307)
  point P61 (23.7017, -51.487)
  point P62 (23.2909, -51.6405)
  point P63 (22.8802, -51.7912)
  point P64 (22.4696, -51.9391)
  point P65 (22.0592, -52.0843)
  point P66 (21.6488, -52.2268)
  point P67 (21.2386, -52.3666)
  point P68 (20.8284, -52.5036)
  point P69 (20.4182, -52.6379)
  point P70 (20.0081, -52.7696)
  point P71 (19.598, -52.8986)
  point P72 (19.1879, -53.0248)
  point P73 (18.7777, -53.1485)
  point P74 (18.3676, -53.2694)
  point P75 (17.9575, -53.3877)
  point P76 (17.5473, -53.5033)
  point P77 (17.137, -53.6163)
  point P78 (16.7267, -53.7267)
  point P79 (16.3164, -53.8344)
  point P80 (15.906, -53.9395)
  point P81 (15.4955, -54.0419)
  point P82 (15.0849, -54.1417)
  point P83 (14.6743, -54.2389)
  point P84 (14.2635, -54.3335)
  point P85 (13.8527, -54.4255)
  point P86 (13.4418, -54.5148)
  point P87 (13.0308, -54.6016)
  point P88 (12.6197, -54.6857)
  point P89 (12.2085, -54.7672)
  point P90 (11.7972, -54.8461)
  point P91 (11.3858, -54.9224)
  point P92 (10.9743, -54.9961)
  point P93 (10.5627, -55.0672)
  point P94 (10.151, -55.1357)
  point P95 (9.7393, -55.2016)
  point P96 (9.3274, -55.2649)
  point P97 (8.9154, -55.3256)
  point P98 (8.5034, -55.3837)
  point P99 (8.0912, -55.4391)
  point P100 (7.679, -55.492)
  point P101 (7.2667, -55.5423)
  point P102 (6.8543, -55.59)
  point P103 (6.4419, -55.6351)
  point P104 (6.0294, -55.6776)
  point P105 (5.6168, -55.7175)
  point P106 (5.2042, -55.7547)
  point P107 (4.7915, -55.7894)
  point P108 (4.3788, -55.8215)
  point P109 (3.966, -55.851)
  point P110 (3.5532, -55.8779)
  point P111 (3.1404, -55.9022)
  point P112 (2.7275, -55.9239)
  point P113 (2.3147, -55.9429)
  point P114 (1.9018, -55.9594)
  point P115 (1.4889, -55.9733)
  point P116 (1.076, -55.9846)
  point P117 (0.6632, -55.9933)
  point P118 (0.2503, -55.9994)
  point P119 (-0.1625, -56.0028)
  point P120 (-0.5753, -56.0037)
  point P121 (-0.9881, -56.002)
  point P122 (-1.4008, -55.9977)
  point P123 (-1.8134, -55.9908)
  point P124 (-2.226, -55.9813)
  point P125 (-2.6386, -55.9691)
  point P126 (-3.051, -55.9544)
  point P127 (-3.4634, -55.9371)
  point P128 (-3.8757, -55.9172)
  point P129 (-4.2879, -55.8947)
  point P130 (-4.7, -55.8695)
  point P131 (-5.112, -55.8418)
  point P132 (-5.5238, -55.8115)
  point P133 (-5.9356, -55.7786)
  point P134 (-6.3472, -55.7431)
  point P135 (-6.7586, -55.705)
  point P136 (-7.17, -55.6643)
  point P137 (-7.5812, -55.621)
  point P138 (-7.9922, -55.5751)
  point P139 (-8.403, -55.5266)
  point P140 (-8.8137, -55.4755)
  point P141 (-9.2243, -55.4219)
  point P142 (-9.6346, -55.3656)
  point P143 (-10.0447, -55.3067)
  point P144 (-10.4547, -55.2452)
  point P145 (-10.8645, -55.1812)
  point P146 (-11.2741, -55.1145)
  point P147 (-11.6834, -55.0453)
  point P148 (-12.0926, -54.9735)
  point P149 (-12.5016, -54.899)
  point P150 (-12.9103, -54.822)
  point P151 (-13.3188, -54.7424)
  point P152 (-13.7271, -54.6602)
  point P153 (-14.1352, -54.5754)
  point P154 (-14.5431, -54.488)
  point P155 (-14.9507, -54.398)
  point P156 (-15.3582, -54.3054)
  point P157 (-15.7654, -54.2102)
  point P158 (-16.1723, -54.1124)
  point P159 (-16.5791, -54.012)
  point P160 (-16.9856, -53.909)
  point P161 (-17.3919, -53.8034)
  point P162 (-17.798, -53.6951)
  point P163 (-18.2039, -53.5843)
  point P164 (-18.6096, -53.4709)
  point P165 (-19.0151, -53.3548)
  point P166 (-19.4204, -53.2361)
  point P167 (-19.8255, -53.1148)
  point P168 (-20.2304, -52.9909)
  point P169 (-20.6351, -52.8643)
  point P170 (-21.0397, -52.7351)
  point P171 (-21.4441, -52.6033)
  point P172 (-21.8483, -52.4688)
  point P173 (-22.2525, -52.3316)
  point P174 (-22.6565, -52.1918)
  point P175 (-23.0604, -52.0493)
  point P176 (-23.4642, -51.9041)
  point P177 (-23.8679, -51.7562)
  point P178 (-24.2716, -51.6056)
  point P179 (-24.6752, -51.4522)
  point P180 (-25.0789, -51.2962)
  point P181 (-25.4825, -51.1374)
  point P182 (-25.8862, -50.9758)
  point P183 (-26.2899, -50.8115)
  point P184 (-26.6937, -50.6443)
  point P185 (-27.0977, -50.4744)
  point P186 (-27.5017, -50.3016)
  point P187 (-27.906, -50.1259)
  point P188 (-28.3104, -49.9474)
  point P189 (-28.7152, -49.766)
  point P190 (-29.1202, -49.5816)
  point P191 (-29.5255, -49.3943)
  point P192 (-29.9312, -49.2039)
  point P193 (-30.3374, -49.0106)
  point P194 (-30.744, -48.8142)
  point P195 (-31.1512, -48.6147)
  point P196 (-31.5589, -48.412)
  point P197 (-31.9673, -48.2062)
  point P198 (-32.3764, -47.9971)
  point P199 (-32.7863, -47.7848)
  dimension "d0" = 2
  dimension "d1" = 1
  dimension "d2" = 7
  dimension "d3" = 5
  dimension "d4" = 60
  dimension "d5" = 60
  dimension "d6" = 96
  dimension "d7" = 60
  dimension "d8" = 36
  dimension "d9" = 15
  dimension "d10" = 90
  dimension "d11" = 15
  dimension "d12" = 16.531
  dimension "d13" = 16.531
  dimension "d14" = 21.042
  dimension "d15" = 21.042
  dimension "d16" = 2
  dimension "d17" = 180
  dimension "d18" = 2
  dimension "d19" = 180
  dimension "d20" = 16.5303
  dimension "d21" = 44.1339
  dimension "d22" = 18.5303
  dimension "d23" = 87.0684
  dimension "d29" = 3
  dimension "d32" = 2
  dimension "d33" = 1
  dimension "d34" = 7
  dimension "d35" = 5
  dimension "d36" = 60
  dimension "d37" = 60
  dimension "d38" = 96
  dimension "d39" = 60
  dimension "d40" = 36
  dimension "d41" = 15
  dimension "d42" = 90
  dimension "d43" = 15
  dimension "d44" = 16.531
  dimension "d45" = 16.531
  dimension "d46" = 21.042
  dimension "d47" = 21.042
  dimension "d48" = 2
  dimension "d49" = 180
  dimension "d50" = 2
  dimension "d51" = 180
  dimension "d52" = 16.5303
  dimension "d53" = 44.1286
  dimension "d54" = 18.5303
  dimension "d55" = 87.0684
extrude "押し出し1" add sketch "スケッチ1" along normal blind 5 contours A7 A9 A15 A16 L31 A25 A24 A23 A22 S4 A21 A20 A19 A18 L30 A43 A14 A8 A6 S2 | A43 L30 A17
equation "\"d6\" = d26 + d28 + d27"
equation "\"d7\" = d26 - d28 + d27"
equation "\"d11\" = d9"
equation "\"d12\" = d13"
equation "\"d13\" = d24"
equation "\"d14\" = d15"
equation "\"d15\" = d25"
equation "\"d38\" = d58 + d60 + d59"
equation "\"d39\" = d58 - d60 + d59"
equation "\"d43\" = d41"
equation "\"d44\" = d45"
equation "\"d45\" = d56"
equation "\"d46\" = d47"
equation "\"d47\" = d57"
equation "\"d24\" = 16.530955deg"
equation "\"d25\" = 21.041744deg"
equation "\"d56\" = 16.530955deg"
equation "\"d57\" = 21.041744deg"
equation "\"d26\" = 53"
equation "\"d28\" = 18"
equation "\"d27\" = 25"
equation "\"d58\" = 53"
equation "\"d60\" = 18"
equation "\"d59\" = 25"
properties part number "脚ゴム" material "ゴム、黒"
